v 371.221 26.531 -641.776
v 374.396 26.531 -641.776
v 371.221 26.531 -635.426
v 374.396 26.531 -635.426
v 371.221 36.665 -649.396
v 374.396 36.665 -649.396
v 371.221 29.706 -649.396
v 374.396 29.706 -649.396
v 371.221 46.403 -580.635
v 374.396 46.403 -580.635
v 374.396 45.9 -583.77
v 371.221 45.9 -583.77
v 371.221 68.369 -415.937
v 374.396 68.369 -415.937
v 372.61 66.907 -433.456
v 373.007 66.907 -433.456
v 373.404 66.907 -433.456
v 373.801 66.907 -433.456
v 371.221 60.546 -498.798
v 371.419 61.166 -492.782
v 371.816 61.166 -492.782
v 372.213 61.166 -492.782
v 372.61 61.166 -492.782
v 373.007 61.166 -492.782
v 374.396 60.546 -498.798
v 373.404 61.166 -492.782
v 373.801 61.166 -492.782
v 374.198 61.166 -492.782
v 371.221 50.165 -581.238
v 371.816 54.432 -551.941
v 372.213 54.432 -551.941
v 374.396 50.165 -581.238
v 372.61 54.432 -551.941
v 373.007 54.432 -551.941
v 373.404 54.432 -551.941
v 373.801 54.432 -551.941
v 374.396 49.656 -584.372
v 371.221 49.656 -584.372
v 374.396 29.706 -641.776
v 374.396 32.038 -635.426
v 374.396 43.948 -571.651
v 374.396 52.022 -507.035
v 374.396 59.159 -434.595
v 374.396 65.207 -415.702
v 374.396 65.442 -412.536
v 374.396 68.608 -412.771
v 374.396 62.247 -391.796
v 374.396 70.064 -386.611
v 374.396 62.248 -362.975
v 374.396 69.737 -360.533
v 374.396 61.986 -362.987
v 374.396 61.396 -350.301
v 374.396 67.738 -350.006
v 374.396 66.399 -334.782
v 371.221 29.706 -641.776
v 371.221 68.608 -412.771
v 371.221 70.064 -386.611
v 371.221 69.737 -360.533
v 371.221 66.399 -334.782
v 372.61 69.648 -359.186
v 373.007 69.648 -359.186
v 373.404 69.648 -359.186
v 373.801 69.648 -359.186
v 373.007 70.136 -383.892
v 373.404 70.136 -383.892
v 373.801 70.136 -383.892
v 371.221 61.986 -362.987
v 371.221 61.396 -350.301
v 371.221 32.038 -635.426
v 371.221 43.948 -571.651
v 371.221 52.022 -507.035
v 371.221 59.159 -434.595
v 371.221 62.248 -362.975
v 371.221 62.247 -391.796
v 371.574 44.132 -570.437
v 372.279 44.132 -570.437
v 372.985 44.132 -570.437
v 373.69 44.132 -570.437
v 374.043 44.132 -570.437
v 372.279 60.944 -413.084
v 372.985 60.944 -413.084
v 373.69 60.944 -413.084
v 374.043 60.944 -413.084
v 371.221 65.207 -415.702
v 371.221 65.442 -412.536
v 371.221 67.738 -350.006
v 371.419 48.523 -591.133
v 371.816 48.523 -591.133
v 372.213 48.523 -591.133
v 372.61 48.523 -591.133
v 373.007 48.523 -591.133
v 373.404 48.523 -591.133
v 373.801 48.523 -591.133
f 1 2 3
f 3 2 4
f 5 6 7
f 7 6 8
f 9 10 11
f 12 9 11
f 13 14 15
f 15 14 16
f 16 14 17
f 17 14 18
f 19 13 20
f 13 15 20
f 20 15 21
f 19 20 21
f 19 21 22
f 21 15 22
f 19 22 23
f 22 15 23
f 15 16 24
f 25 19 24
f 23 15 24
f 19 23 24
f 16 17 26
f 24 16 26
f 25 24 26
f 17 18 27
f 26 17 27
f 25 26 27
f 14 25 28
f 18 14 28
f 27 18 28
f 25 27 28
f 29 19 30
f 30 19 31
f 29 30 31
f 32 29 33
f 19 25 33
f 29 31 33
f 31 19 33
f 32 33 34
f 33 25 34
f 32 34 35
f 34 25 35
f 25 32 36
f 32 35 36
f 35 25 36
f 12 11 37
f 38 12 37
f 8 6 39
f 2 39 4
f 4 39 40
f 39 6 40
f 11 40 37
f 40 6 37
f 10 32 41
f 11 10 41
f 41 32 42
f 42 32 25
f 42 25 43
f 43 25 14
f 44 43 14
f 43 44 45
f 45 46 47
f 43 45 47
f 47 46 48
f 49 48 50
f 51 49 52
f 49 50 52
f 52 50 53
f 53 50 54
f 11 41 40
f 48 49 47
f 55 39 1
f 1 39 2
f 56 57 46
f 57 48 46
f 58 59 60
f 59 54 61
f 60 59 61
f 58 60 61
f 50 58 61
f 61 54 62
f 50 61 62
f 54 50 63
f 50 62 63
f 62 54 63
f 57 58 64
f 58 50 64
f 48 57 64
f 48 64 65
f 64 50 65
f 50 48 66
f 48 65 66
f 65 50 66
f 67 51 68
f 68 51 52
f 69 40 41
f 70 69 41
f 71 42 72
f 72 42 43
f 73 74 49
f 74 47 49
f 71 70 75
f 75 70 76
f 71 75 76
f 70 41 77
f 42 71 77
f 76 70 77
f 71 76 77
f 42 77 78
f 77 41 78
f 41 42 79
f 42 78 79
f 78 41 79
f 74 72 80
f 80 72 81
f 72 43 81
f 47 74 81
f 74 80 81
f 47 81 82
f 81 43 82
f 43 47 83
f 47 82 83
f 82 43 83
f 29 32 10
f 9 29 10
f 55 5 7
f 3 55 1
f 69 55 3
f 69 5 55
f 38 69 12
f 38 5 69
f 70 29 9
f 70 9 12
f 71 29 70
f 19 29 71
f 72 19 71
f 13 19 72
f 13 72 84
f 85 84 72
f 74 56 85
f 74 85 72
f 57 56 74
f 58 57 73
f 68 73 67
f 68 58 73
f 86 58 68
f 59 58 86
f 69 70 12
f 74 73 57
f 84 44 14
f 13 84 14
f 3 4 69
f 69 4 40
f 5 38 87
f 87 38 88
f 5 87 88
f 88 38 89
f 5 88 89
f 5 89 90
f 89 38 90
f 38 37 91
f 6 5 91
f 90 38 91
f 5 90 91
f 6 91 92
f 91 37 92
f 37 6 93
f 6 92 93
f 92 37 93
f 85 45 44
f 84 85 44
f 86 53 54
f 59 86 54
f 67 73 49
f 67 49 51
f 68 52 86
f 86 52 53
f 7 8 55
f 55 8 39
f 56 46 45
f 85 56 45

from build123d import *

# Parameters (mm, degrees)
BOSS_EXTRUDE1_DEPTH = 3.175
CUT_EXTRUDE2_DEPTH  = 654.189890262


# Read off the part's stored shape, not the designer's step: Boss-Extrude1
with BuildPart() as part:
    # Boss-Extrude1 outline → Boss-Extrude1 (new body)
    with BuildSketch(Plane.ZY.offset(-374.396)):
        with BuildLine():
            Line((-350.005555185, 67.737635502), (-334.782029636, 66.399219608))
            add(Edge.make_bspline(
                [(-334.782029636, 66.399219608), (-341.240992873, 67.71308737), (-347.74232472, 68.638657355), (-360.813939728, 69.857875705), (-367.384157752, 70.152121032), (-377.278023699, 70.240289498), (-380.582377007, 70.21104298), (-387.201130434, 70.060473417), (-390.515432634, 69.93917268), (-400.442556531, 69.475337941), (-407.050981704, 69.038378743), (-420.258917861, 68.046554904), (-426.858412994, 67.491480581), (-440.052925111, 66.322100745), (-446.647894367, 65.707163942), (-459.835648192, 64.448394083), (-466.427223814, 63.804330657), (-479.607322045, 62.50019263), (-486.195809267, 61.839186708), (-499.368381394, 60.491985482), (-505.952419458, 59.805522168), (-519.112316449, 58.385795781), (-525.688093125, 57.65206208), (-538.826196256, 56.107634603), (-545.388480731, 55.296700626), (-558.494335759, 53.567754504), (-571.581318222, 51.730822492), (-584.623705512, 49.638723817), (-597.641863597, 47.407989391), (-604.13891642, 46.223810013), (-623.594156247, 42.465750982), (-636.516219668, 39.685177786), (-649.396489798, 36.665469863)],
                knots=[0, 0, 0, 0, 0.0625, 0.0625, 0.125, 0.125, 0.15625, 0.15625, 0.1875, 0.1875, 0.25, 0.25, 0.3125, 0.3125, 0.375, 0.375, 0.4375, 0.4375, 0.5, 0.5, 0.5625, 0.5625, 0.625, 0.625, 0.6875, 0.6875, 0.75, 0.8125, 0.8125, 0.875, 0.875, 1, 1, 1, 1], degree=3))
            Line((-649.396489798, 36.665469863), (-649.396489798, 29.706488542))
            Line((-649.396489798, 29.706488542), (-641.776489798, 29.706488949))
            Line((-641.776489798, 29.706488949), (-641.776489798, 26.531488949))
            Line((-641.776489798, 26.531488949), (-635.426489798, 26.531488949))
            Line((-635.426489798, 26.531488949), (-635.426489798, 32.037642177))
            add(Edge.make_bspline(
                [(-635.426489798, 32.037642177), (-626.699809587, 33.973901403), (-605.09971112, 38.470828669), (-570.497357953, 44.389700719), (-531.419980681, 49.46349027), (-492.027742402, 53.62689392), (-452.50992836, 57.538262976), (-419.617452947, 60.566295678), (-393.439667345, 62.303633962), (-376.715776716, 62.747417071), (-366.64401335, 62.448215888), (-362.974756295, 62.248064299)],
                knots=[0.039842207, 0.039842207, 0.039842207, 0.039842207, 0.125, 0.25, 0.375, 0.5, 0.625, 0.75, 0.8125, 0.875, 0.911151113, 0.911151113, 0.911151113, 0.911151113], degree=3))
            Line((-362.974756295, 62.248064299), (-362.98694118, 61.986221215))
            Line((-362.98694118, 61.986221215), (-350.300669898, 61.395864564))
            Line((-350.300669898, 61.395864564), (-350.005555185, 67.737635502))
        make_face()
    extrude(amount=BOSS_EXTRUDE1_DEPTH)

    # Sketch4 → Cut-Extrude2 (cut, through all)
    with BuildSketch(Plane(origin=(374.396, 0, 0), x_dir=(0, 0, -1), z_dir=(1, 0, 0))):
        Polygon((412.770923092, 68.608490806), (412.535760157, 65.442211698), (415.702039265, 65.207048762), (415.936865021, 68.368788015), (416.025397802, 69.560810453), (412.859118694, 69.795973389), align=None)
        Polygon((581.238436134, 50.164660341), (580.634677235, 46.402802397), (583.769558855, 45.899669981), (584.372489798, 49.656369157), (584.640659894, 51.327264289), (581.505778274, 51.830396705), align=None)
    extrude(amount=-CUT_EXTRUDE2_DEPTH, mode=Mode.SUBTRACT)


solid = part.part
